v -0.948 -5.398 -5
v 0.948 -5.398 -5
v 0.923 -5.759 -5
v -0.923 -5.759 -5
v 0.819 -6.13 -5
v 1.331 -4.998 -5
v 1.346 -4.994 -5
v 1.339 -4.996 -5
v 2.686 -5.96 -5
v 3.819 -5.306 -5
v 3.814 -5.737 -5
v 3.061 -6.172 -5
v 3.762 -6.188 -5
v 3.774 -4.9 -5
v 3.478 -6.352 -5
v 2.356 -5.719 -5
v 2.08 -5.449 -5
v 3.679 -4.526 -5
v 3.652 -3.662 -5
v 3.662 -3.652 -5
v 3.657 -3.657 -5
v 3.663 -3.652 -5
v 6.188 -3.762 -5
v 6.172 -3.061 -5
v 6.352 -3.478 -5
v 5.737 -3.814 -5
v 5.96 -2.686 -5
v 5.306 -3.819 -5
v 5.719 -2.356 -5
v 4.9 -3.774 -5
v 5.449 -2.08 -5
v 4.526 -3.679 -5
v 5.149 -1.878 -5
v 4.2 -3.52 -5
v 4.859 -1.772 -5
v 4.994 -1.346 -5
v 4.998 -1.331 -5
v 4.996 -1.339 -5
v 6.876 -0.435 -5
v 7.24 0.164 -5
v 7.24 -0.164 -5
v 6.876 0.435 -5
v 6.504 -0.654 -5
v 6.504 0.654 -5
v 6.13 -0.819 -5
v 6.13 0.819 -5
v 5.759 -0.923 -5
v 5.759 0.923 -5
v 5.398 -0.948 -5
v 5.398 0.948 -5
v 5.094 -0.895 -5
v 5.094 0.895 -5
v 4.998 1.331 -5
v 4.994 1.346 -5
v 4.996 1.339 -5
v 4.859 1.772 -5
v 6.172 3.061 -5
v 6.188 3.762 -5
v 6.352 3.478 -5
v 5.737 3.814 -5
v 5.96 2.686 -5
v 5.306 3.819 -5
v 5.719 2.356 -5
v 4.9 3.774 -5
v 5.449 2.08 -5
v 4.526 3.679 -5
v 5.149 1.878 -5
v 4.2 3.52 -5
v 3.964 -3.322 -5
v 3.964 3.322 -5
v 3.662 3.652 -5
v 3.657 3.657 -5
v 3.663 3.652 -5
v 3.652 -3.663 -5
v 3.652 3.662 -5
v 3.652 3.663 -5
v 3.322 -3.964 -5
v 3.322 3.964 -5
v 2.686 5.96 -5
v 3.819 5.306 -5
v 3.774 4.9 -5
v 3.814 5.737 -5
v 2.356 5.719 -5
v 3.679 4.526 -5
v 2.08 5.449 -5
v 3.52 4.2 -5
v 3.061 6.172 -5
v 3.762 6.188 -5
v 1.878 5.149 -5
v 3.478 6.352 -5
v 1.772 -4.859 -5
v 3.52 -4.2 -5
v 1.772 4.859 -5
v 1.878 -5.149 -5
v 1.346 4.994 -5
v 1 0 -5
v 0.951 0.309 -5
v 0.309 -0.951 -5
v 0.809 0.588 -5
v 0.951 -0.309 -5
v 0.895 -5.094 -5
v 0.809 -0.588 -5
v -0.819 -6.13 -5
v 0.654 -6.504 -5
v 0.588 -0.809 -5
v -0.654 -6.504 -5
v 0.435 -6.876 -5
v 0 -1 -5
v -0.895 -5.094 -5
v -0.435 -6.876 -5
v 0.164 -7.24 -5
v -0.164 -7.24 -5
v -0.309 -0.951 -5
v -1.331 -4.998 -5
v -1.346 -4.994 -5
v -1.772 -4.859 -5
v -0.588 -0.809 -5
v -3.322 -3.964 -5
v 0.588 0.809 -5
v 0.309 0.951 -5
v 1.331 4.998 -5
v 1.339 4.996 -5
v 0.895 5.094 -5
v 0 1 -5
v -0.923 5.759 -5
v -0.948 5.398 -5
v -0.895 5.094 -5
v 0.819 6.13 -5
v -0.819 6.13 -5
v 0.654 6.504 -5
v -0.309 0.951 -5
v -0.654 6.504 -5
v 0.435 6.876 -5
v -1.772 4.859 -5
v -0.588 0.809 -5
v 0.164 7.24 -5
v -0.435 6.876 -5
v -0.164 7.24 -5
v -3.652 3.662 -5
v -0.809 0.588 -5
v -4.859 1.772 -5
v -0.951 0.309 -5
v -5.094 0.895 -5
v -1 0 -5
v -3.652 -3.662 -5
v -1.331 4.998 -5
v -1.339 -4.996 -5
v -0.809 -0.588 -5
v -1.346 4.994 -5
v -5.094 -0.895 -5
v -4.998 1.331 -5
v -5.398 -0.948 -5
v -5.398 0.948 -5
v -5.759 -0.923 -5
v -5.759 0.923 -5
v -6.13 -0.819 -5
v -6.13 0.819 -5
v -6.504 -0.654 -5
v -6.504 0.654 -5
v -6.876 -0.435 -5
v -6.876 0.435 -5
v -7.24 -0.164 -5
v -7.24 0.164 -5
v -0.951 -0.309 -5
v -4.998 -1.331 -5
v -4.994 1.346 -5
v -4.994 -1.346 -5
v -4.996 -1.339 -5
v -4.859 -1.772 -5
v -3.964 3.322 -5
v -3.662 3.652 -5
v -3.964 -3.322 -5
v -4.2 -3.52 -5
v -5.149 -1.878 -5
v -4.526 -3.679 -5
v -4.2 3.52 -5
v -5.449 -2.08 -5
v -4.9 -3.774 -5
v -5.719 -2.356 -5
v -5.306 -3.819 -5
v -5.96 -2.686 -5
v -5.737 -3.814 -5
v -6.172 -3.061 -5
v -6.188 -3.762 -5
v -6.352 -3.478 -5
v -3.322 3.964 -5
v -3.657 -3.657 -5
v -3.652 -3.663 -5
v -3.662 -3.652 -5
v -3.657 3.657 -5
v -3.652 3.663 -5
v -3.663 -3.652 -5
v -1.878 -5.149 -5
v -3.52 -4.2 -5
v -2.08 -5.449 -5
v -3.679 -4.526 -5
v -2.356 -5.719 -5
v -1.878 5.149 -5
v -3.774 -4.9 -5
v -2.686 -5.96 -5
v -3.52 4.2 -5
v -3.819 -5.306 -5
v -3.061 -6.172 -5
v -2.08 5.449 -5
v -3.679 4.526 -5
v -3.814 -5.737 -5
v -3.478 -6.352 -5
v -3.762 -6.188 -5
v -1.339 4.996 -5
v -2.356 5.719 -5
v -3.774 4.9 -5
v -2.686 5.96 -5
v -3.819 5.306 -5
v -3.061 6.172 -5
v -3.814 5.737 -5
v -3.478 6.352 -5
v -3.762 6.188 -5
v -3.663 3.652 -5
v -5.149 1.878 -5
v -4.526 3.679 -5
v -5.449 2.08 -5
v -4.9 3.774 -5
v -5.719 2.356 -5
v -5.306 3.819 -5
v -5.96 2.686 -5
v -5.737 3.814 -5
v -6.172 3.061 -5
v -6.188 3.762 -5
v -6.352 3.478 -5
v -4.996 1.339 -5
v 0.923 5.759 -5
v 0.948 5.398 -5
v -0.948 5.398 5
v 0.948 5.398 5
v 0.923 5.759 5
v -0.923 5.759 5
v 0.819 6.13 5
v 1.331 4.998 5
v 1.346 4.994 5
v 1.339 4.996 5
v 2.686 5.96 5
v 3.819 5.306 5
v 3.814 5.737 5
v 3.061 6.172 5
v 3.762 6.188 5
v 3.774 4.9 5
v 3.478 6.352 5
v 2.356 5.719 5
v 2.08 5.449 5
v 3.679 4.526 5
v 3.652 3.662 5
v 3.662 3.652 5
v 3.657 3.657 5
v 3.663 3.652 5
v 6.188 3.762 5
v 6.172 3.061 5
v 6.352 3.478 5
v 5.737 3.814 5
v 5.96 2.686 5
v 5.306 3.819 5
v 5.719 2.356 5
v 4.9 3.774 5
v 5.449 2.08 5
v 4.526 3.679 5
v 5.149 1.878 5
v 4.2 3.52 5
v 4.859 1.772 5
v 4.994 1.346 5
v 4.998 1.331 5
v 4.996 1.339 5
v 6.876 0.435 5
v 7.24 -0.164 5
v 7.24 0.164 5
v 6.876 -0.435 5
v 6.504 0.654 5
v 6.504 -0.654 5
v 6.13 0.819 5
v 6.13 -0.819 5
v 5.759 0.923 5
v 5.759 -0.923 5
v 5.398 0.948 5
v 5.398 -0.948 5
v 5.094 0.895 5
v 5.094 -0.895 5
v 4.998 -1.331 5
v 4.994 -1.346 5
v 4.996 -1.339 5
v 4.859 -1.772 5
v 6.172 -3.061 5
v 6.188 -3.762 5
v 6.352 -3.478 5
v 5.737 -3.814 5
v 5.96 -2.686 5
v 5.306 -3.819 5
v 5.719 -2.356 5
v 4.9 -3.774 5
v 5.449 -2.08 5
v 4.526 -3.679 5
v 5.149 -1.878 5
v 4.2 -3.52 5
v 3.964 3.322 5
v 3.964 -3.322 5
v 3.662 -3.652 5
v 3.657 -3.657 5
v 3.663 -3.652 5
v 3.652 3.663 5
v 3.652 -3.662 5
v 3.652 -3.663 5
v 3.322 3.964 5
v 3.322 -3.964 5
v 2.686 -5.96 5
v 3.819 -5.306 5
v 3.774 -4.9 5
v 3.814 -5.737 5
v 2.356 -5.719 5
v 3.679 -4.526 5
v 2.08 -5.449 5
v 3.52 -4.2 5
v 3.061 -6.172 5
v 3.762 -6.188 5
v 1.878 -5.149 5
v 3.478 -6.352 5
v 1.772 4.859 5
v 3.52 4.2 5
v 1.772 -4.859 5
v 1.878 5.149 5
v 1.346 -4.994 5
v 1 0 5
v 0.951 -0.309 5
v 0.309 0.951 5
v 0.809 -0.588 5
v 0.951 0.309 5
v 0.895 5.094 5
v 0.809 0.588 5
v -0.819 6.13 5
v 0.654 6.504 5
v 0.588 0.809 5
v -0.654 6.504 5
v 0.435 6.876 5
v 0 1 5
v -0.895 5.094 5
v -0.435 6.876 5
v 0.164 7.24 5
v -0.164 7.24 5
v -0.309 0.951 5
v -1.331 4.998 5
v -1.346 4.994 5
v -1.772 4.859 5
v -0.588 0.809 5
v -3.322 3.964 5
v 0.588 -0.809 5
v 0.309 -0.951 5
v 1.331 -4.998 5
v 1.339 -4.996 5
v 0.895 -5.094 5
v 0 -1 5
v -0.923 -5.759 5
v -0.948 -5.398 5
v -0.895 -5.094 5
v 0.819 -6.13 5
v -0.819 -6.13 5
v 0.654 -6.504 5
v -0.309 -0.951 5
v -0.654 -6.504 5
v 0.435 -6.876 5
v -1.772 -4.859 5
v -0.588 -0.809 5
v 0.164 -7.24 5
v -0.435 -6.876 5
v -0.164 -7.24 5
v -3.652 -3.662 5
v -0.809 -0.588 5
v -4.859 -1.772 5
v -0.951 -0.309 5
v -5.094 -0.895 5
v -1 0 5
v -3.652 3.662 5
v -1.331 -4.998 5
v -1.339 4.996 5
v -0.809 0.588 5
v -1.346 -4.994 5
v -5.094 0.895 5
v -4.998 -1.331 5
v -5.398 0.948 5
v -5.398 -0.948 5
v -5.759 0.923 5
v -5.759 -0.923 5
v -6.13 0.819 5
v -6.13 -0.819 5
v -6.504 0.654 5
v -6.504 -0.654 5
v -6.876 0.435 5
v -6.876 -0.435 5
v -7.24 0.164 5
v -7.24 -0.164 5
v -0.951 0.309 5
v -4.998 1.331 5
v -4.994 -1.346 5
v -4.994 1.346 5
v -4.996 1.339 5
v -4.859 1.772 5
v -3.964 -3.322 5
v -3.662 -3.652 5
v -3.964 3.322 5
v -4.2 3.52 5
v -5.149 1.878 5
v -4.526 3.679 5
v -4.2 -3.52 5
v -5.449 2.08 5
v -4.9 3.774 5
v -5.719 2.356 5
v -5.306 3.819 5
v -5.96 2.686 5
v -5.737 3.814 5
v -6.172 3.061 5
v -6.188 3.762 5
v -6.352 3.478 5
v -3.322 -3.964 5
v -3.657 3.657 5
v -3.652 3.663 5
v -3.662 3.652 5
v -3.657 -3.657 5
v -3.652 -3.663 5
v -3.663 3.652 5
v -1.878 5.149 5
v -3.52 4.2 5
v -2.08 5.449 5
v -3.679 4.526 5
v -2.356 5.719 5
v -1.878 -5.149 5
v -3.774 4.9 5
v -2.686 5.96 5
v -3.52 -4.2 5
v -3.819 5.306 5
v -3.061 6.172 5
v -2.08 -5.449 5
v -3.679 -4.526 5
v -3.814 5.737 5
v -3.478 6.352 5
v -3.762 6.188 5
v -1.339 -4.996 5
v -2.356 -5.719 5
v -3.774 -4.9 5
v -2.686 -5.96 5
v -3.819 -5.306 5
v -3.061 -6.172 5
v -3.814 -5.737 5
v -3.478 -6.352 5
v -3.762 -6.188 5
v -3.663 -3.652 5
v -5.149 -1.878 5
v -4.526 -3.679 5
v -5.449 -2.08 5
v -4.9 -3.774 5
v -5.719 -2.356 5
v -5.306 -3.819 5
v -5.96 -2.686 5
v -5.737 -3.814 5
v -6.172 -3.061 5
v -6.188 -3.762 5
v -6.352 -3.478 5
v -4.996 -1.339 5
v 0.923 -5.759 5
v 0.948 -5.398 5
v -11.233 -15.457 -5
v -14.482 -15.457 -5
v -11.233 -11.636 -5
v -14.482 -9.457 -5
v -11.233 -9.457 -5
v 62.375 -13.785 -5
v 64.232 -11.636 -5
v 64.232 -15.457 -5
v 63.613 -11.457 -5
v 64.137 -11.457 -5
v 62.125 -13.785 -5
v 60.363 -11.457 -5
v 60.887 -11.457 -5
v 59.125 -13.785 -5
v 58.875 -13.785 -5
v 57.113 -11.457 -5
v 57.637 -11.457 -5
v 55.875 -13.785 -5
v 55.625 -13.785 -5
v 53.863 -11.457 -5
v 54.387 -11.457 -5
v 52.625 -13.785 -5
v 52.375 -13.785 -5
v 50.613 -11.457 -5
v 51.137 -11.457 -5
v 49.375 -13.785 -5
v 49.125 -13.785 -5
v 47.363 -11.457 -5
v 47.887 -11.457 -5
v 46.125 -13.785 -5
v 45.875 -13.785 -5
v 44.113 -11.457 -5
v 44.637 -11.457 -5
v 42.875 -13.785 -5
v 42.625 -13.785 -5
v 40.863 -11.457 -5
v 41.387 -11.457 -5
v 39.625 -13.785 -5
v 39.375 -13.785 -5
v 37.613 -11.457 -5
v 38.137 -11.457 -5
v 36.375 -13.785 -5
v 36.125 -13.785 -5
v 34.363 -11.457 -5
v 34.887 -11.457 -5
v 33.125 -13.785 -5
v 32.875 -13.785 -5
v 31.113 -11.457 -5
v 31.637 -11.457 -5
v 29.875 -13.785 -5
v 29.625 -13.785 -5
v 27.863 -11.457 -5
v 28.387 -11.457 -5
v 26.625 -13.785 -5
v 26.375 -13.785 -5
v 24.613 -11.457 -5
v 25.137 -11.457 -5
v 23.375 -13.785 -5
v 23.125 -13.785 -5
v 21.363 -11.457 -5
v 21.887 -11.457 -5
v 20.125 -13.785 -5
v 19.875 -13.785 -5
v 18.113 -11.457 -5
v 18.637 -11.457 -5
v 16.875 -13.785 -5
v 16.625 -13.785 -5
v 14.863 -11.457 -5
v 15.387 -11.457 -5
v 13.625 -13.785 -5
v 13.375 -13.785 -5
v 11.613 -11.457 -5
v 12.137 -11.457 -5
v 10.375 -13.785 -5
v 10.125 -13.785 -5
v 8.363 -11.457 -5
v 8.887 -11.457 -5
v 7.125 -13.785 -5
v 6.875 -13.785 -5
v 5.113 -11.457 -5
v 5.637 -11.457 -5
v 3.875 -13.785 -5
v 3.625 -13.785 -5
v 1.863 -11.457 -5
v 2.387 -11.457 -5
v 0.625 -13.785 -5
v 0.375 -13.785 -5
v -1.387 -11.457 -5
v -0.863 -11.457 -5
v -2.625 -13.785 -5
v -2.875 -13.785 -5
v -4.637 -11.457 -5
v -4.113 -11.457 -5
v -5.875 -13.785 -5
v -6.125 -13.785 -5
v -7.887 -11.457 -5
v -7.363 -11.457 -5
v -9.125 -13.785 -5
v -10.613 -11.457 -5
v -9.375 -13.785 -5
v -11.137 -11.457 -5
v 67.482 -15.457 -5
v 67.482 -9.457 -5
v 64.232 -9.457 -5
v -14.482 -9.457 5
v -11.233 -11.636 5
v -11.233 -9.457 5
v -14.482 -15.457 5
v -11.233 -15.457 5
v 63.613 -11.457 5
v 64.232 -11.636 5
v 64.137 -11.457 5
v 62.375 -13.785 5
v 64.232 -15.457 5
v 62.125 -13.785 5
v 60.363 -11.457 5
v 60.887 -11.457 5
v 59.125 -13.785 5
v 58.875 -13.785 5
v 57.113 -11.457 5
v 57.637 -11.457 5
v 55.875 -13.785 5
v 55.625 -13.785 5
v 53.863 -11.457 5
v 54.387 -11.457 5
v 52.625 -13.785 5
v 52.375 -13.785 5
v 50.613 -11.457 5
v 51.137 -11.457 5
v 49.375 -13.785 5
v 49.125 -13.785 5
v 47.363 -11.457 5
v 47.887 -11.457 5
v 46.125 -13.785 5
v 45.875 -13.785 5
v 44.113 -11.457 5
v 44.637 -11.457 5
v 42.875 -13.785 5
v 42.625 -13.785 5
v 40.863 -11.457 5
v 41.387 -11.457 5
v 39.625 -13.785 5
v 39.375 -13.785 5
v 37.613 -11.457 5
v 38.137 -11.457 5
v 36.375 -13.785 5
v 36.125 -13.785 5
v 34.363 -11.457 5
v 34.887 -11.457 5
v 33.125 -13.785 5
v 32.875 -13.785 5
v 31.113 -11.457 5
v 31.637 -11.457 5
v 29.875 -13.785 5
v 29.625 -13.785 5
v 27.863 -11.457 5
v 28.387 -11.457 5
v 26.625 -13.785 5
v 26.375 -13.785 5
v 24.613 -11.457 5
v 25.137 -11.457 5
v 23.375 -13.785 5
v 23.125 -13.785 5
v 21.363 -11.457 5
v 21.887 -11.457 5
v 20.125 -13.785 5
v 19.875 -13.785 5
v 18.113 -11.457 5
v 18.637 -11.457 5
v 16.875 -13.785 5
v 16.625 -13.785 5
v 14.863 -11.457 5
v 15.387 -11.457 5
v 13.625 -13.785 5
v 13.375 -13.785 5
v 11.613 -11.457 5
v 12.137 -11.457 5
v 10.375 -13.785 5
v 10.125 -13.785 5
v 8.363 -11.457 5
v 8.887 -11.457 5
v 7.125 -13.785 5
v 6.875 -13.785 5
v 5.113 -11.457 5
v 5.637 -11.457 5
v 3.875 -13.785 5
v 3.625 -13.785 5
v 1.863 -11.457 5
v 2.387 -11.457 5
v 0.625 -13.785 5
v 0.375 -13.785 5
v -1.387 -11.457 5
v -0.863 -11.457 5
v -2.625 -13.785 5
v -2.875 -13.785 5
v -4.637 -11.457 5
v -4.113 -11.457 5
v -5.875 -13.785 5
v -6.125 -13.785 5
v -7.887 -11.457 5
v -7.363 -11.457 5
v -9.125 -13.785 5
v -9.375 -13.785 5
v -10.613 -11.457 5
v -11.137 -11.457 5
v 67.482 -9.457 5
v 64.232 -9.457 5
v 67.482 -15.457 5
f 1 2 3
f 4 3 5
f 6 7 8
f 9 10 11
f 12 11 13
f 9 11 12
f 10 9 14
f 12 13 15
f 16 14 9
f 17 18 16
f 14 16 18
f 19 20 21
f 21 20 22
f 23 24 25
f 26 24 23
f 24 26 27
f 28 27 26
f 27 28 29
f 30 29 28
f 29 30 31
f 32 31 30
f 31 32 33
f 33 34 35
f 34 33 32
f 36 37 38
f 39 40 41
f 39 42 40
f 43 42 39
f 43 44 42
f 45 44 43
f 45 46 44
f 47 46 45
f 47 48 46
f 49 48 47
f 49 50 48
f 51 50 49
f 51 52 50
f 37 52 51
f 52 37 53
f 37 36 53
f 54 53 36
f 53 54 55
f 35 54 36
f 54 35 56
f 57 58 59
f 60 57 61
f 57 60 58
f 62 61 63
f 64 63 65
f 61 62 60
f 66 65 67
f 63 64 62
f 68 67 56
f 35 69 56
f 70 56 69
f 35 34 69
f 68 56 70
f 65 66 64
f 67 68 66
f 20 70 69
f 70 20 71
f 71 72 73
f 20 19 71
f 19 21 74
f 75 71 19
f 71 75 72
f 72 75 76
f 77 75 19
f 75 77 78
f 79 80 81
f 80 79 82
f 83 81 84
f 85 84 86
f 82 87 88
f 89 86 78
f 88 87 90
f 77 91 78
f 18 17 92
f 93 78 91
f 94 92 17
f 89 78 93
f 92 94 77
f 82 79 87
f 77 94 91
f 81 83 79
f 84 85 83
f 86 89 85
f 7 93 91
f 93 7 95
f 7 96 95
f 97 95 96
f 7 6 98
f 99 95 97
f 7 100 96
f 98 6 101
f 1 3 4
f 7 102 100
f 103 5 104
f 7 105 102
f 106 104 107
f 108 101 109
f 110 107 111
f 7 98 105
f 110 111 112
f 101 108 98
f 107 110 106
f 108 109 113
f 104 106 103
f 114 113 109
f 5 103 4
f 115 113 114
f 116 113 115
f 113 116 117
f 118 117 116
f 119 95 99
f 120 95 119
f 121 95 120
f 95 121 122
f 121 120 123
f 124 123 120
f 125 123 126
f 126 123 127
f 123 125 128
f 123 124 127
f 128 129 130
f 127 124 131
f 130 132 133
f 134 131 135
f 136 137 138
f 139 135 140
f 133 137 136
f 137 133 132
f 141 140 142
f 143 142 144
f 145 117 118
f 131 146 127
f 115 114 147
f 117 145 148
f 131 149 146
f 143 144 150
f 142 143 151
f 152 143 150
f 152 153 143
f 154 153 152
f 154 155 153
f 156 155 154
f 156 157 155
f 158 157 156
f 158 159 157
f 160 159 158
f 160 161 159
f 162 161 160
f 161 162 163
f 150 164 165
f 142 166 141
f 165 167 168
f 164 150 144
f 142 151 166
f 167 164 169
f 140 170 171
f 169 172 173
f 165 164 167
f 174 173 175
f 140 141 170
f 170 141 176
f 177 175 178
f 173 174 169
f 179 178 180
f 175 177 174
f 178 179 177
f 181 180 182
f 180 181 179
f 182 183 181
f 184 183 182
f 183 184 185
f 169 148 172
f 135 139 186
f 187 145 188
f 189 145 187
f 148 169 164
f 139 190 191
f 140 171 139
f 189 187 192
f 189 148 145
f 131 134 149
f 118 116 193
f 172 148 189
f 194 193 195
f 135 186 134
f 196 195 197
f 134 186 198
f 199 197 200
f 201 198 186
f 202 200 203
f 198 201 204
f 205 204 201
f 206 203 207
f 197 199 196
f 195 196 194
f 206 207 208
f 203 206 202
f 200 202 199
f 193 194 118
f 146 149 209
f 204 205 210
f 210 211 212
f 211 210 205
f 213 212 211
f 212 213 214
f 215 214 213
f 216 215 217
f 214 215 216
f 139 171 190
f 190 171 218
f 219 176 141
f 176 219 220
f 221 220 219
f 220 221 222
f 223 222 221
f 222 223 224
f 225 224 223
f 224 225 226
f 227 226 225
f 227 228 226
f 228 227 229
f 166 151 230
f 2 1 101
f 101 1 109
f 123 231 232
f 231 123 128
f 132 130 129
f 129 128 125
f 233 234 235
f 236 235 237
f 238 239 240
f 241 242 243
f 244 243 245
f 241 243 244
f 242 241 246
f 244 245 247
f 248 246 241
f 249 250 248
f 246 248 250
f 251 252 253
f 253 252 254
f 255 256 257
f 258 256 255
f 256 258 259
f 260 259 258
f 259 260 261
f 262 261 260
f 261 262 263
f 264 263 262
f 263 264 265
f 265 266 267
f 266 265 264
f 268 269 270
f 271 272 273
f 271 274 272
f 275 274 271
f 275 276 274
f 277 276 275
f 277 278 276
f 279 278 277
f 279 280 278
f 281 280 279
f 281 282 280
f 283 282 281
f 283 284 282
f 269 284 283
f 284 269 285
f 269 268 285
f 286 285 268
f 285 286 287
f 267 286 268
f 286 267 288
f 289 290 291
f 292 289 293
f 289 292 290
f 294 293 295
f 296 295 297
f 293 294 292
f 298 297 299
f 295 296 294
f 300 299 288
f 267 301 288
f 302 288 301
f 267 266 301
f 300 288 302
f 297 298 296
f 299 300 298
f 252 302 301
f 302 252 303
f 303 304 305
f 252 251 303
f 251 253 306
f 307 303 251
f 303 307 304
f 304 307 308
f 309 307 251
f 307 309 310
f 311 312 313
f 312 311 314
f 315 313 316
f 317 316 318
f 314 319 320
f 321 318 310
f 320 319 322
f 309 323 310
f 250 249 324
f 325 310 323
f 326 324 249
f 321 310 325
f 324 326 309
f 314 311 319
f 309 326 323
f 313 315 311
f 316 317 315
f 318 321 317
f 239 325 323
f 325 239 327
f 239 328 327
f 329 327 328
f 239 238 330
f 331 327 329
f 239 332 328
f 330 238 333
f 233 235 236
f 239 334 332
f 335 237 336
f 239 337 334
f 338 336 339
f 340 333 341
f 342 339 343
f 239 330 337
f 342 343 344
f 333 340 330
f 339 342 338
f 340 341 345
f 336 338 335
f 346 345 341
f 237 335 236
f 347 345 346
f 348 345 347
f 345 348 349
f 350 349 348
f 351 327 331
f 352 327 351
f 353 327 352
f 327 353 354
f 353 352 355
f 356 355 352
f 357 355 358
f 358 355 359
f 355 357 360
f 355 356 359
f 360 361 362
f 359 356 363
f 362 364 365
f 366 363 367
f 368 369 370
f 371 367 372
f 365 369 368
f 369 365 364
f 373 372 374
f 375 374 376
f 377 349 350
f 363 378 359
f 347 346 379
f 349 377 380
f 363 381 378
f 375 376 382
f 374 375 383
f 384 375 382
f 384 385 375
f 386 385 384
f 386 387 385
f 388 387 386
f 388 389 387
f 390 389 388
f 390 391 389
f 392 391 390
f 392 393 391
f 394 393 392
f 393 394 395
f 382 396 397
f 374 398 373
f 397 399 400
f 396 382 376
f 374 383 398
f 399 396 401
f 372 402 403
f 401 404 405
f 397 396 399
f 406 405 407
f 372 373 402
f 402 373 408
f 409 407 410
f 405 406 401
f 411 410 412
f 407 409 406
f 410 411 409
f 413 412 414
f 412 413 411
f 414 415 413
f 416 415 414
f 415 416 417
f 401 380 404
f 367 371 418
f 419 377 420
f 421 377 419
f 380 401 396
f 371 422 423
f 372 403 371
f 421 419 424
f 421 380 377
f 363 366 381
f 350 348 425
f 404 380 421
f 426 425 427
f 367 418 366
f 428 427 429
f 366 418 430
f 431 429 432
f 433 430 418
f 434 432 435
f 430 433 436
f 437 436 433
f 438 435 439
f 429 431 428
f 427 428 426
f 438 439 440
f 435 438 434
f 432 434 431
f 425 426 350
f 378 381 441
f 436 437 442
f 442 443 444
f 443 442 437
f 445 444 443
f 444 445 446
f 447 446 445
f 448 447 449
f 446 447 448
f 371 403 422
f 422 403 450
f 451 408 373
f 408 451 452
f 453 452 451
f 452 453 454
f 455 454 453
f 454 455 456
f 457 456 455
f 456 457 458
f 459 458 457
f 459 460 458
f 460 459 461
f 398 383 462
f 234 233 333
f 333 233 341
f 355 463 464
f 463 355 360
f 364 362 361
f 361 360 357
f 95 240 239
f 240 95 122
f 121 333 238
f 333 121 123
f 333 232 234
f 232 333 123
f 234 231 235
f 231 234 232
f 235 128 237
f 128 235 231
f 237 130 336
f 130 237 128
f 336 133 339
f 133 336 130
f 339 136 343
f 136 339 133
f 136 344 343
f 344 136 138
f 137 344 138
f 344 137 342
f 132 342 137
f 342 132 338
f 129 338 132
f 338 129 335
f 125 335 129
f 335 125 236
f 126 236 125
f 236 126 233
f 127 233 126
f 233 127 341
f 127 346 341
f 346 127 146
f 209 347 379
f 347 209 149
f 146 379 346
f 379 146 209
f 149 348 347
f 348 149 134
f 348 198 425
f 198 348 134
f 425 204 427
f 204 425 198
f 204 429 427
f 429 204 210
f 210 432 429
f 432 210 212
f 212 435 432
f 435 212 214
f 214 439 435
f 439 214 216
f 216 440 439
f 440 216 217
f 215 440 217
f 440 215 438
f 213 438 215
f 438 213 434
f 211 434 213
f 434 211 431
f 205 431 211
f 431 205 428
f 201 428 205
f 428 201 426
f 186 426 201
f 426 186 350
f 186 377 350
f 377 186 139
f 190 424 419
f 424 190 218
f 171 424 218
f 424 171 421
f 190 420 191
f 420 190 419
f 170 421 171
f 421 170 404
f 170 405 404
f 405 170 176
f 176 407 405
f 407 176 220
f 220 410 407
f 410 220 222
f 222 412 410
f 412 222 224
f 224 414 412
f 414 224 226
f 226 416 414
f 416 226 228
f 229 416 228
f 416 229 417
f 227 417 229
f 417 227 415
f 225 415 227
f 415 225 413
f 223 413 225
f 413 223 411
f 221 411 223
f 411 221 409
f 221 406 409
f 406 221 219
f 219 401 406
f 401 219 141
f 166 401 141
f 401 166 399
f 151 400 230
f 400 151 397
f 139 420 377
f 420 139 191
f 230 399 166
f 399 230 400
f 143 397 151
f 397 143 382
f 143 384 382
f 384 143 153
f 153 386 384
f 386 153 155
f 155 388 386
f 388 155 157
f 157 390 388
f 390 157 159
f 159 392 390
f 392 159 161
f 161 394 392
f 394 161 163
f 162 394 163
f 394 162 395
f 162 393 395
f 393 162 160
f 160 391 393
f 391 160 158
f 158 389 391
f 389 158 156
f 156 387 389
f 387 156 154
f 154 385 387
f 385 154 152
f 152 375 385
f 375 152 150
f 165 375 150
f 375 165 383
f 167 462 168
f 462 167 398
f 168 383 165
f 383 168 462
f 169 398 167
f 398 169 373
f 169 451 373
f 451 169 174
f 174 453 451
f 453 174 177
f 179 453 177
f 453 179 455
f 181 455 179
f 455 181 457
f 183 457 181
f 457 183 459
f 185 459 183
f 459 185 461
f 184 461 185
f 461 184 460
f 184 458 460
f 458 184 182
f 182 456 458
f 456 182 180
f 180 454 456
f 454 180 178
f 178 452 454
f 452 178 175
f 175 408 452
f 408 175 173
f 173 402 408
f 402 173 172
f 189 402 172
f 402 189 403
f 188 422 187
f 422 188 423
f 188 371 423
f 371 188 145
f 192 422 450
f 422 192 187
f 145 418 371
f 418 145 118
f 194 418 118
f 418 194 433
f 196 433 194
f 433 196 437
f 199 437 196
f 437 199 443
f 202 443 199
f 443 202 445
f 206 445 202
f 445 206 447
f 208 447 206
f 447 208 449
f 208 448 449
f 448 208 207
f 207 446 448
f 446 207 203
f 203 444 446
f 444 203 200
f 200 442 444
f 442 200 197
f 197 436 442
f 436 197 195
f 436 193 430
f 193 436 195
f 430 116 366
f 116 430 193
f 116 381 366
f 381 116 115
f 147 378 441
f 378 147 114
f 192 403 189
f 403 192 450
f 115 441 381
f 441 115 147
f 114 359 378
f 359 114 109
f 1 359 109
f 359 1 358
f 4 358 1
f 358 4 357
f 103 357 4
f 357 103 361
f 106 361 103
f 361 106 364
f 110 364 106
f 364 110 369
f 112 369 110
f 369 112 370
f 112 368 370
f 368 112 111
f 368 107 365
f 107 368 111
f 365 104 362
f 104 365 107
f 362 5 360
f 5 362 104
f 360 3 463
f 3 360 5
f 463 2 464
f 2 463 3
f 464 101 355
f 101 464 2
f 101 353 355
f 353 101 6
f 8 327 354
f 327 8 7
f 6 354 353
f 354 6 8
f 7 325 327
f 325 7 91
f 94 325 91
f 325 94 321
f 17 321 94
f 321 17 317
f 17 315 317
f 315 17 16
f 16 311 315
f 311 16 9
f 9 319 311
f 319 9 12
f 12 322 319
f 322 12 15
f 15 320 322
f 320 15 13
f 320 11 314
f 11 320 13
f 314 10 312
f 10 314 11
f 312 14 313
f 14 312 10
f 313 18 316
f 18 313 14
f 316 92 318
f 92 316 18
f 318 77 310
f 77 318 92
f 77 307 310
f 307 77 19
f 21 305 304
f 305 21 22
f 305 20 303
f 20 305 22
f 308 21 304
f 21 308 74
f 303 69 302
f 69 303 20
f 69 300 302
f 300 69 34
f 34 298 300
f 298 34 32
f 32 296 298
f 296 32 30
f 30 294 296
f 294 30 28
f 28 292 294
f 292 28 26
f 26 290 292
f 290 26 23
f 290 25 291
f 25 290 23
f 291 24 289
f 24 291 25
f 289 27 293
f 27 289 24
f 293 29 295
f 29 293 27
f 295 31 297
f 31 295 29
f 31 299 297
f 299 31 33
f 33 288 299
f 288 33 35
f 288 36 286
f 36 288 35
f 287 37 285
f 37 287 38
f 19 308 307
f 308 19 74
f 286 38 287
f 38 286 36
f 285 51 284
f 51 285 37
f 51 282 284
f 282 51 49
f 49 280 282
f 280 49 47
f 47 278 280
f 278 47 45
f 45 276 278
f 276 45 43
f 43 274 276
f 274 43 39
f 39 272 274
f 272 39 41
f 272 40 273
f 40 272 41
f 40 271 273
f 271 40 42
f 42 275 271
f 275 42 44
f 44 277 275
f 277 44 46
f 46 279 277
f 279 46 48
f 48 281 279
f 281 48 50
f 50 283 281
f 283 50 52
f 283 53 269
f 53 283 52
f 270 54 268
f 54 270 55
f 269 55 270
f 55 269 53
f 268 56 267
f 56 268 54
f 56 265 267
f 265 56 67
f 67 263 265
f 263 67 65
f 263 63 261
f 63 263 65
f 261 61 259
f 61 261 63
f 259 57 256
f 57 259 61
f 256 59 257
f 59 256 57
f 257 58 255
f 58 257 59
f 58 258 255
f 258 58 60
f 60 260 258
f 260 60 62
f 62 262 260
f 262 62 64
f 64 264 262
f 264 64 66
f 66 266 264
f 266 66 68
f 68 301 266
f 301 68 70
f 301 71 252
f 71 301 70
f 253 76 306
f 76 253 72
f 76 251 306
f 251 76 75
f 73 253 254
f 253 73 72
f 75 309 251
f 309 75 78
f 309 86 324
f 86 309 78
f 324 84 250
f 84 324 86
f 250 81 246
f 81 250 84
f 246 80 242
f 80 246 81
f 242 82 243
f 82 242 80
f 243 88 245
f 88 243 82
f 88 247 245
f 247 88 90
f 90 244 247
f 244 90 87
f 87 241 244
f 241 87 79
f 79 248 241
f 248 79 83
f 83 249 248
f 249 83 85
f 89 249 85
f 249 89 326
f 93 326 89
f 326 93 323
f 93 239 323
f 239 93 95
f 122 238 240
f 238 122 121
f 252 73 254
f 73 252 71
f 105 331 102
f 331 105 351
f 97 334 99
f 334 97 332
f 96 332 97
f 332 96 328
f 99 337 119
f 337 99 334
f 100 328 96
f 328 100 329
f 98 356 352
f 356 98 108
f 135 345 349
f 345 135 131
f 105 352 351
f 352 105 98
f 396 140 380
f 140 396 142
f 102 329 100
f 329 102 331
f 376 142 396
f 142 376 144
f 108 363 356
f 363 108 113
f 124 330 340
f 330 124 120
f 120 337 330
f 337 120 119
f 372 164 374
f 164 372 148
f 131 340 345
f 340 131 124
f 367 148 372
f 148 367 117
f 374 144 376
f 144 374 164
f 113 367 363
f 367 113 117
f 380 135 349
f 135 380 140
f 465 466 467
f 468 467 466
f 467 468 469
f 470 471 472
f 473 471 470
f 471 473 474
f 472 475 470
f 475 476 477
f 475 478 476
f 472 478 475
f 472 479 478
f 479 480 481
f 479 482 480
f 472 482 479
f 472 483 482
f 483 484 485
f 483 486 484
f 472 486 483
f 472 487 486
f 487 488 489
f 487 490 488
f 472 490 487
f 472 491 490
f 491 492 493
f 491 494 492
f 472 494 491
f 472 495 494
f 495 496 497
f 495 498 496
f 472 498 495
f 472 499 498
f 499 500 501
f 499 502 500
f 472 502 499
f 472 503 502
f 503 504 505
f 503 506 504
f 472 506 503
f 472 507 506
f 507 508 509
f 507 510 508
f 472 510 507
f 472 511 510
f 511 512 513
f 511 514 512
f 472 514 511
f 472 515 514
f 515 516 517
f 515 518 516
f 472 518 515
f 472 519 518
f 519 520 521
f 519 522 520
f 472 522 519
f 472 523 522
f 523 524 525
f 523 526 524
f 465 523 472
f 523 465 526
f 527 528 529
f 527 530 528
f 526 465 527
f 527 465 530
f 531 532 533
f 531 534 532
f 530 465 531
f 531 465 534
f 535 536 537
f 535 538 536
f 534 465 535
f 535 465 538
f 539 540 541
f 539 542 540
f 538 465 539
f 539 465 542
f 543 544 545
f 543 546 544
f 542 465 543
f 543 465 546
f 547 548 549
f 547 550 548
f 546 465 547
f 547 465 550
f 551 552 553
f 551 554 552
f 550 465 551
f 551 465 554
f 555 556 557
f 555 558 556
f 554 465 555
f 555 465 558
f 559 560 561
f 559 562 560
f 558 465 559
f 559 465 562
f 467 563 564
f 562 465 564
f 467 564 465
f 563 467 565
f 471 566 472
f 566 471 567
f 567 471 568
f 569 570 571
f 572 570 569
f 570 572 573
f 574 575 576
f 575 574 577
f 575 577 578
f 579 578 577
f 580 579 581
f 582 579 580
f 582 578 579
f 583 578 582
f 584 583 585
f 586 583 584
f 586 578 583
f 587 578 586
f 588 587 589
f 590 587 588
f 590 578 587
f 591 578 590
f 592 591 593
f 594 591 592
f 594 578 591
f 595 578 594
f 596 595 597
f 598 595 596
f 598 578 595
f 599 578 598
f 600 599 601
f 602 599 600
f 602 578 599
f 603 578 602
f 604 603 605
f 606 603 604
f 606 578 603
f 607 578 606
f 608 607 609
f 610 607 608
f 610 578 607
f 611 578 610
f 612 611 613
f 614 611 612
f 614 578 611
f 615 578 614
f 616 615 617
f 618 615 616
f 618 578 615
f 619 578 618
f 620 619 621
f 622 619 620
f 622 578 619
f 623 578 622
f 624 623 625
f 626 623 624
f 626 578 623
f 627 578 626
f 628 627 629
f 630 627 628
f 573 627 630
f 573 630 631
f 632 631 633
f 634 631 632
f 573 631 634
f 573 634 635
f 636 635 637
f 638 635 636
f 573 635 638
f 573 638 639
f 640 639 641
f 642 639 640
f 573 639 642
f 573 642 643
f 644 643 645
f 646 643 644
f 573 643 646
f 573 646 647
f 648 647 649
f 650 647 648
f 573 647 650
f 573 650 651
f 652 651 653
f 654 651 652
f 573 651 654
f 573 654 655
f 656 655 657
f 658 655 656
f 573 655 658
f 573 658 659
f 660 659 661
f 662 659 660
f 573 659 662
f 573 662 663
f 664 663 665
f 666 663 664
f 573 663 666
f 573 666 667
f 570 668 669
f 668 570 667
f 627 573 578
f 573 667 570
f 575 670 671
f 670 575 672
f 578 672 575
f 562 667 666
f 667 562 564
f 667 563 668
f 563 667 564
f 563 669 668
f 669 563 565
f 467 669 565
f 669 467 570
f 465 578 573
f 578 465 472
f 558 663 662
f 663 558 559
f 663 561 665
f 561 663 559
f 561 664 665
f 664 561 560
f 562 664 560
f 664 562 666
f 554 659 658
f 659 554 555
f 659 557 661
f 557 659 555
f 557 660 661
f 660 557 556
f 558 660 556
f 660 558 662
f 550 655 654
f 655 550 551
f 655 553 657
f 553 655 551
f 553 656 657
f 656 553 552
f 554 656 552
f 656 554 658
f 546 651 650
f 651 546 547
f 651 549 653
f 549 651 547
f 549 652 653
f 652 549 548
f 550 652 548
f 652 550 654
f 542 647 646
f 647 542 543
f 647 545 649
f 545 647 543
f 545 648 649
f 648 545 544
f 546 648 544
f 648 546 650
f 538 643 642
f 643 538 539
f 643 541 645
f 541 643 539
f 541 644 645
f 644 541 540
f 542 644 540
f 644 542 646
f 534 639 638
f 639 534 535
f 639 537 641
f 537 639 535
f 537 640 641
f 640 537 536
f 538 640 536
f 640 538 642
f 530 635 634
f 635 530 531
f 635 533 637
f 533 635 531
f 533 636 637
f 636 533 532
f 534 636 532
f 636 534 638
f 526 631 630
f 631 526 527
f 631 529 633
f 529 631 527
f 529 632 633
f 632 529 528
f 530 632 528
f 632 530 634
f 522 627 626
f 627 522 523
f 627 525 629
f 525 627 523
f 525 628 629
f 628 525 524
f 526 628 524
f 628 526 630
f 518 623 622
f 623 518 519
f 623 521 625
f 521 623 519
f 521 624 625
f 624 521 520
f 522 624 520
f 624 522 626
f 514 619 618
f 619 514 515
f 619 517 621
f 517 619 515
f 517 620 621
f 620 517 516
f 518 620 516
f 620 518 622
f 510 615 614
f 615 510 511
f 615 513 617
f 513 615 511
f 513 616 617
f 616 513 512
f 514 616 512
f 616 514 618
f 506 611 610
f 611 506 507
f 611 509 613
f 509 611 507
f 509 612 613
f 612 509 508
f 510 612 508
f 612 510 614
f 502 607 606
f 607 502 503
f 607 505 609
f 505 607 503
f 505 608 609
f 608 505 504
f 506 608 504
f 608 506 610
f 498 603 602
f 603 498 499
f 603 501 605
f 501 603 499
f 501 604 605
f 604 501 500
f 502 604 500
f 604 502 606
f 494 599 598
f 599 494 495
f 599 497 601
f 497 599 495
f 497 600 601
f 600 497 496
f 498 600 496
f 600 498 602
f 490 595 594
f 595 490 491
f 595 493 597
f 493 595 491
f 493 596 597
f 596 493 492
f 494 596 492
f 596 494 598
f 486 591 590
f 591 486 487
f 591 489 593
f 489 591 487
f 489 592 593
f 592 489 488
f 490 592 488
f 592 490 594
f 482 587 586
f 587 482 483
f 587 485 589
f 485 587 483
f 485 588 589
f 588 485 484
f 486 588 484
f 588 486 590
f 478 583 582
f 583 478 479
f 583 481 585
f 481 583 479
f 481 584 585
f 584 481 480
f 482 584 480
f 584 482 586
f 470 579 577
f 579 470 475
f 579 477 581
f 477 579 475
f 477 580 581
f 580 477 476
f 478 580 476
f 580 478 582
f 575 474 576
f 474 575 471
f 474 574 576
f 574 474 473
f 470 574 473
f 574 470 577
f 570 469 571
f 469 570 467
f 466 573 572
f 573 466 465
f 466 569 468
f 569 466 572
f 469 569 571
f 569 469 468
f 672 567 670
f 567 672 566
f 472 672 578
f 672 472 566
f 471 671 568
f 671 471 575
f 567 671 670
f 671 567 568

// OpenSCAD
//This is a modification of " Public Domain Parametric Involute Spur Gear (and involute helical gear and involute rack)
// by Leemon Baird, 2011, Leemon@Leemon.com
//http://www.thingiverse.com/thing:5505  "

//Modifications by racatack June 2016:
// v1.0, 6/24/16:
//  -Incorporated 'module InvoluteGear_rack()' from the 11/11/15 comment by quisam2342 in thing:5505 to fix noted problems in rack generation at various tooth sizes
//  -Added a section for an optional 'backboard' that can be used to stiffen an otherwise skinny rack
//  -Added sections for optional Stop Blocks at either or both ends of a rack
//  -Removed extra gears from the example since I only need one pinion. See thing:5505 example section to gain more insight into gear generation.
//v1.1, 6/28/16:
//  -Added sections to optionally create mounting flanges on the bottom/backside of the rack. Flanges can be at either or both ends, or longitudinal.

//TO GENERATE A CUSTOM RACK AND PINION ENTER INPUTS AT LINES 345-377


//////////////////////////////////////////////////////////////////////////////////////////////
// Public Domain Parametric Involute Spur Gear (and involute helical gear and involute rack)
// version 1.1
// by Leemon Baird, 2011, Leemon@Leemon.com
//http://www.thingiverse.com/thing:5505
//
// This file is public domain.  Use it for any purpose, including commercial
// applications.  Attribution would be nice, but is not required.  There is
// no warranty of any kind, including its correctness, usefulness, or safety.
// 
// This is parameterized involute spur (or helical) gear.  It is much simpler and less powerful than
// others on Thingiverse.  But it is public domain.  I implemented it from scratch from the 
// descriptions and equations on Wikipedia and the web, using Mathematica for calculations and testing,
// and I now release it into the public domain.
//
//		http://en.wikipedia.org/wiki/Involute_gear
//		http://en.wikipedia.org/wiki/Gear
//		http://en.wikipedia.org/wiki/List_of_gear_nomenclature
//		http://gtrebaol.free.fr/doc/catia/spur_gear.html
//		http://www.cs.cmu.edu/~rapidproto/mechanisms/chpt7.html
//
// The module gear() gives an involute spur gear, with reasonable defaults for all the parameters.
// Normally, you should just choose the first 4 parameters, and let the rest be default values.
// The module gear() gives a gear in the XY plane, centered on the origin, with one tooth centered on
// the positive Y axis.  The various functions below it take the same parameters, and return various
// measurements for the gear.  The most important is pitch_radius, which tells how far apart to space
// gears that are meshing, and adendum_radius, which gives the size of the region filled by the gear.
// A gear has a "pitch circle", which is an invisible circle that cuts through the middle of each
// tooth (though not the exact center). In order for two gears to mesh, their pitch circles should 
// just touch.  So the distance between their centers should be pitch_radius() for one, plus pitch_radius() 
// for the other, which gives the radii of their pitch circles.
//
// In order for two gears to mesh, they must have the same mm_per_tooth and pressure_angle parameters.  
// mm_per_tooth gives the number of millimeters of arc around the pitch circle covered by one tooth and one
// space between teeth.  The pitch angle controls how flat or bulged the sides of the teeth are.  Common
// values include 14.5 degrees and 20 degrees, and occasionally 25.  Though I've seen 28 recommended for
// plastic gears. Larger numbers bulge out more, giving stronger teeth, so 28 degrees is the default here.
//
// The ratio of number_of_teeth for two meshing gears gives how many times one will make a full 
// revolution when the the other makes one full revolution.  If the two numbers are coprime (i.e. 
// are not both divisible by the same number greater than 1), then every tooth on one gear
// will meet every tooth on the other, for more even wear.  So coprime numbers of teeth are good.
//
// The module rack() gives a rack, which is a bar with teeth.  A rack can mesh with any
// gear that has the same mm_per_tooth and pressure_angle.
//
// Some terminology: 
// The outline of a gear is a smooth circle (the "pitch circle") which has mountains and valleys
// added so it is toothed.  So there is an inner circle (the "root circle") that touches the 
// base of all the teeth, an outer circle that touches the tips of all the teeth,
// and the invisible pitch circle in between them.  There is also a "base circle", which can be smaller than
// all three of the others, which controls the shape of the teeth.  The side of each tooth lies on the path 
// that the end of a string would follow if it were wrapped tightly around the base circle, then slowly unwound.  
// That shape is an "involute", which gives this type of gear its name.
//
//////////////////////////////////////////////////////////////////////////////////////////////

//An involute spur gear, with reasonable defaults for all the parameters.
//Normally, you should just choose the first 4 parameters, and let the rest be default values.
//Meshing gears must match in mm_per_tooth, pressure_angle, and twist,
//and be separated by the sum of their pitch radii, which can be found with pitch_radius().
module gear (
	mm_per_tooth    = 3,    //this is the "circular pitch", the circumference of the pitch circle divided by the number of teeth
	number_of_teeth = 11,   //total number of teeth around the entire perimeter
	thickness       = 6,    //thickness of gear in mm
	hole_diameter   = 3,    //diameter of the hole in the center, in mm
	twist           = 0,    //teeth rotate this many degrees from bottom of gear to top.  360 makes the gear a screw with each thread going around once
	teeth_to_hide   = 0,    //number of teeth to delete to make this only a fraction of a circle
	pressure_angle  = 28,   //Controls how straight or bulged the tooth sides are. In degrees.
	clearance       = 0.0,  //gap between top of a tooth on one gear and bottom of valley on a meshing gear (in millimeters)
	backlash        = 0.0   //gap between two meshing teeth, in the direction along the circumference of the pitch circle
) {
	assign(pi = 3.1415926)
	assign(p  = mm_per_tooth * number_of_teeth / pi / 2)  //radius of pitch circle
	assign(c  = p + mm_per_tooth / pi - clearance)        //radius of outer circle
	assign(b  = p*cos(pressure_angle))                    //radius of base circle
	assign(r  = p-(c-p)-clearance)                        //radius of root circle
	assign(t  = mm_per_tooth/2-backlash/2)                //tooth thickness at pitch circle
	assign(k  = -iang(b, p) - t/2/p/pi*180) {             //angle to where involute meets base circle on each side of tooth
		difference() {
			for (i = [0:number_of_teeth-teeth_to_hide-1] )
				rotate([0,0,i*360/number_of_teeth])
					linear_extrude(height = thickness, center = true, convexity = 10, twist = twist)
						polygon(
							points=[
								[0, -hole_diameter/10],
								polar(r, -181/number_of_teeth),
								polar(r, r<b ? k : -180/number_of_teeth),
								q7(0/5,r,b,c,k, 1),q7(1/5,r,b,c,k, 1),q7(2/5,r,b,c,k, 1),q7(3/5,r,b,c,k, 1),q7(4/5,r,b,c,k, 1),q7(5/5,r,b,c,k, 1),
								q7(5/5,r,b,c,k,-1),q7(4/5,r,b,c,k,-1),q7(3/5,r,b,c,k,-1),q7(2/5,r,b,c,k,-1),q7(1/5,r,b,c,k,-1),q7(0/5,r,b,c,k,-1),
								polar(r, r<b ? -k : 180/number_of_teeth),
								polar(r, 181/number_of_teeth)
							],
 							paths=[[0,1,2,3,4,5,6,7,8,9,10,11,12,13,14,15,16]]
						);
			cylinder(h=2*thickness+1, r=hole_diameter/2, center=true, $fn=20);
		}
	}
};	
//these 4 functions are used by gear
function polar(r,theta)   = r*[sin(theta), cos(theta)];                            //convert polar to cartesian coordinates
function iang(r1,r2)      = sqrt((r2/r1)*(r2/r1) - 1)/3.1415926*180 - acos(r1/r2); //unwind a string this many degrees to go from radius r1 to radius r2
function q7(f,r,b,r2,t,s) = q6(b,s,t,(1-f)*max(b,r)+f*r2);                         //radius a fraction f up the curved side of the tooth 
function q6(b,s,t,d)      = polar(d,s*(iang(b,d)+t));                              //point at radius d on the involute curve

//a rack, which is a straight line with teeth (the same as a segment from a giant gear with a huge number of teeth).
//The "pitch circle" is a line along the X axis.
//module rack (
//	mm_per_tooth    = 3,    //this is the "circular pitch", the circumference of the pitch circle divided by the number //of teeth
//	number_of_teeth = 11,   //total number of teeth along the rack
//	thickness       = 6,    //thickness of rack in mm (affects each tooth)
//	height          = 120,   //height of rack in mm, from tooth top to far side of rack.
//	pressure_angle  = 28,   //Controls how straight or bulged the tooth sides are. In degrees.
//	backlash        = 0.0   //gap between two meshing teeth, in the direction along the circumference of the pitch circle
//) {
//	assign(pi = 3.1415926)
//	assign(a = mm_per_tooth / pi) //addendum
//	assign(t = a*cos(pressure_angle)-1)         //tooth side is tilted so top/bottom corners move this amount
//		for (i = [0:number_of_teeth-1] )
//			translate([i*mm_per_tooth,0,0])
//				linear_extrude(height = thickness, center = true, convexity = 10)
//					polygon(
//						points=[
//							[-mm_per_tooth * 3/4,                 a-height],
//							[-mm_per_tooth * 3/4 - backlash,     -a],
//							[-mm_per_tooth * 1/4 + backlash - t, -a],
//							[-mm_per_tooth * 1/4 + backlash + t,  a],
//							[ mm_per_tooth * 1/4 - backlash - t,  a],
//							[ mm_per_tooth * 1/4 - backlash + t, -a],
//							[ mm_per_tooth * 3/4 + backlash,     -a],
//							[ mm_per_tooth * 3/4,                 a-height],
//						],
//						paths=[[0,1,2,3,4,5,6,7]]
//					);
//};	


  //rac note - This section generates the rack body and teeth. It is from the 11/11/15 comment by quisam2342 in thing:5505 to fix noted problems with rack generation, and replaces the original 'module rack()'
////////////////////////////////////////////////////////////////////////////////////////////////
// The module InvoluteGear_rack() gives a involute gear rack, which is a bar with teeth.
// A rack can mesh with any gear that has the same mm_per_tooth and pressure_angle.
// The "pitch circle" is a line along the X axis.
//
// mm_per_tooth     this is the "circular pitch", the circumference of the pitch circle
//                  divided by the number of teeth
//
// number_of_teeth  total number of teeth along the rack
//
// thickness        thickness of rack in mm
//
// height           height of rack in mm, from tooth top to far side of rack
//
// pressure_angle   controls how straight or bulged the tooth sides are, in degrees
//
// clearance        gap between top of a tooth on one gear and bottom of valley
//                  on a meshing gear, in millimeters
//
// backlash         gap between two meshing teeth, in the direction along the circumference
//                  of the pitch circle
////////////////////////////////////////////////////////////////////////////////////////////////



module InvoluteGear_rack (

   //Default numbers in this section get overridden by numbers in 'example rack and pinion' section, so set your values there.
   
    mm_per_tooth    = 3, //all meshing gears need the same mm_per_tooth 
    number_of_teeth = 11,
    thickness       = 6,
    height          = 4,
    
  //rac - Added variables for backboard, stop blocks and mounting flanges: 
 //set your values in the 'example rack and pinion' section, as defaults given here will be overridden by that section 
    backboard_thickness = 2.0,
    backboard_height = 1.0,
    side_flange_thickness = 0,
    side_flange_height = 0,
    flange_offset = 0, 
    stop_height = backboard_height,
    left_stop_enable = 1, 
    right_stop_enable = 1,
    flange_height = 0,
    left_flange_enable = 1, 
    right_flange_enable = 1,
    
//These defaults are not redefined in the example section:
    pressure_angle  = 28,  //all meshing gears need the same pressure_angle
    clearance       = 0.0,
    backlash        = 0.0

)

{
    // addendum - tooth height above pitch line
    assign(addendum =        module_value(mm_per_tooth) - clearance)

    // dedendum - tooth height below pitch line
    assign(dedendum = 1.25 * module_value(mm_per_tooth)            ) 


    for (i = [0:number_of_teeth-1] )
        translate([(i+0.5)*mm_per_tooth,height-addendum,0])
            linear_extrude(height = thickness, center = true, convexity = 10)  //'height' parameter here is not the same as 'height' parameter of module. Here it effectively is the width or thickness as the rack is extruded from one side-face to the other.
                polygon(
                    points=[
                        [-1/2 * mm_per_tooth,                                              addendum-height],
                        [-1/2 * mm_per_tooth,                                             -dedendum],
                        [-1/4 * mm_per_tooth + backlash - dedendum * tan(pressure_angle), -dedendum],
                        [-1/4 * mm_per_tooth + backlash + addendum * tan(pressure_angle),  addendum],
                        [ 1/4 * mm_per_tooth - backlash - addendum * tan(pressure_angle),  addendum],
                        [ 1/4 * mm_per_tooth - backlash + dedendum * tan(pressure_angle), -dedendum],
                        [ 1/2 * mm_per_tooth,                                             -dedendum],
                        [ 1/2 * mm_per_tooth,                                              addendum-height],
                    ],
                    paths=[[0,1,2,3,4,5,6,7]]
                );

   //rac -added - This section optionally creates a 'stop block' at the left end of the rack
            translate([(-0.11)*mm_per_tooth,0,0.5*(-thickness)])  
            linear_extrude(height = left_stop_enable*thickness, center = false, convexity = 10)
                polygon(
                    points=[
                        [-1/2 * mm_per_tooth,height+stop_height],   //stop_height extends stop block above teeth, change the number to change the extension amount
                        [-1/2 * mm_per_tooth,0],
                        [ 1/2 * mm_per_tooth,0],
                        [ 1/2 * mm_per_tooth,height+stop_height],   //stop_height extends stop block above teeth, change the number to change the extension amount
                    ],
                    paths=[[0,1,2,3]]
                );


    //rac -added - This section optionally creates a 'stop block' at the right end of the rack
            translate([(0.11+number_of_teeth)*mm_per_tooth,0,0.5*(-thickness)])  
            linear_extrude(height = right_stop_enable*thickness, center = false, convexity = 10)
                polygon(
                    points=[
                        [-1/2 * mm_per_tooth,height+stop_height],   //stop_height extends stop block above teeth
                        [-1/2 * mm_per_tooth,0],
                        [ 1/2 * mm_per_tooth,0],
                        [ 1/2 * mm_per_tooth,height+stop_height],   //stop_height extends stop block above teeth
                    ],
                    paths=[[0,1,2,3]]
                );


    //rac -added - This section optionally creates a flange at the left rear of the rack
            translate([(-0.11)*mm_per_tooth,0,0.5*(-thickness)])   
            linear_extrude(height = left_flange_enable*thickness, center = false, convexity = 10)
                polygon(
                    points=[
                        [-1/2 * mm_per_tooth,-flange_height],   //flange_height extends flange beyond rack bottom
                        [-1/2 * mm_per_tooth,0],
                        [ 1/2 * mm_per_tooth,0],
                        [ 1/2 * mm_per_tooth,-flange_height],   //flange_height extends flange beyond rack bottom
                    ],
                    paths=[[0,1,2,3]]
                );



    //rac -added - This section optionally creates a flange at the right rear of the rack
            translate([(0.11+number_of_teeth)*mm_per_tooth,0,0.5*(-thickness)])  
            linear_extrude(height = right_flange_enable*thickness, center = false, convexity = 10)
                polygon(
                    points=[
                        [-1/2 * mm_per_tooth,-flange_height],   //flange_height extends flange beyond rack bottom
                        [-1/2 * mm_per_tooth,0],
                        [ 1/2 * mm_per_tooth,0],
                        [ 1/2 * mm_per_tooth,-flange_height],   //flange_height extends flange beyond rack bottom
                    ],
                    paths=[[0,1,2,3]]
                );



    //rac -added - This section optionally creates a 'Backboard' on one side of the rack. Can be used to add stiffness for a 'thin' rack (i.e. a rack with low height and/or thickness numbers) or if a large negative height is used it can extend under the rack as a mounting flange.
    for (i = [0:number_of_teeth-1] )
        translate([(i+0.5)*mm_per_tooth,0,0.5*(-thickness+backboard_thickness)])    
        //0.5*(-thickness+backboard_thickness) starts the backboard at one side of the rack and extrudes it inward
            linear_extrude(height = backboard_thickness, center = true, convexity = 10)
                polygon(
                    points=[
                        [-1/2 * mm_per_tooth,height+backboard_height],   //backboard_height extends backboard above teeth
                        [-1/2 * mm_per_tooth,0],

                        [ 1/2 * mm_per_tooth,0],
                        [ 1/2 * mm_per_tooth,height+backboard_height],   //backboard_height extends backboard above teeth
                    ],
                    paths=[[0,1,2,3]]
                );


    //rac -added - This section optionally creates a Rear Side-Flange on along one side of the rack. Can be used to add stiffness for a 'thin' rack (i.e. a rack with low height and/or thickness numbers) or it can be used as a mounting flange.
    for (i = [0:number_of_teeth-1] )
        translate([(i+0.5)*mm_per_tooth,0,0.5*(-thickness+side_flange_thickness)+flange_offset])    
        //0.5*(-side_flange_thickness) starts the backboard at one side of the rack and extrudes it inward. flange_offset moves the flange toward the other side of the rack
            linear_extrude(height = side_flange_thickness, center = true, convexity = 10)
                polygon(
                    points=[
                        [-1/2 * mm_per_tooth,-side_flange_height],   //side_flange_height extends side_flange beyond rack bottom
                        [-1/2 * mm_per_tooth,0],

                        [ 1/2 * mm_per_tooth,0],
                        [ 1/2 * mm_per_tooth,-side_flange_height],   //side_flange_height extends backboard beyond rack bottom
                    ],
                    paths=[[0,1,2,3]]
                );

}


//These 5 functions let the user find the derived dimensions of the gear.
//A gear fits within a circle of radius outer_radius, and two gears should have
//their centers separated by the sum of their pictch_radius.
function circular_pitch  (mm_per_tooth=3) = mm_per_tooth;                     //tooth density expressed as "circular pitch" in millimeters
function diametral_pitch (mm_per_tooth=3) = 3.1415926 / mm_per_tooth;         //tooth density expressed as "diametral pitch" in teeth per millimeter
function module_value    (mm_per_tooth=3) = mm_per_tooth / 3.1415926;                //tooth density expressed as "module" or "modulus" in millimeters
function pitch_radius    (mm_per_tooth=3,number_of_teeth=11) = mm_per_tooth * number_of_teeth / 3.1415926 / 2;
function outer_radius    (mm_per_tooth=3,number_of_teeth=11,clearance=0.1)    //The gear fits entirely within a cylinder of this radius.
	= mm_per_tooth*(1+number_of_teeth/2)/3.1415926  - clearance;              





//////////////////////////////////////////////////////////////////////////////////////////////

//GENERATE A RACK AND PINION 
//ENTER YOUR VALUES HERE: (not in defaults of InvoluteGear_rack() or gear() modules)

//The variable names can be confusing - experiment! Change something then click the dotted cube with Fast-Forward arrows.

//example rack and pinion:
//all distances in mm
n1 = 12; //red gear number of teeth. Set to zero if you don't want to print a pinion.
n5 = 24;  //gray rack number of teeth.  Set to 1 if you don't want to print a rack- that's as small as it gets (you'll get 2 teeth if you set it to zero... I haven't tried to determine why that happens)
mm_per_tooth = 3.25;
thickness    = 10;  // depth of the rack from side-to-side, including backboard if any. The pinion will be this depth minus the backboard_thickness
hole         = 2;   //hole diameter in pinion gear
height       = 4;  // distance from bottom of the rack to the tips of the teeth

//rac-Added - Set your values here for  a Backboard along one side of the teeth.
backboard_thickness = 0; //set to zero for no backboard
    backboard_height = 2;   //set to zero for top of backboard to be even with tips of teeth, a positive number will extend above the teeth by the chosen amount. Negative number will place the top of the backboard lower than the teeth.

//rac-Added - Set your values here for a rear Side-Flange along one side of the teeth extending to the rear of the rack (opposite the direction of a backboard).
side_flange_thickness = 0; //set to zero for no rear Side-Flange
    side_flange_height = 10; // A positive number extends the side-flange beyond the bottom of the rack the by specified amount.
    flange_offset = 0; //Set to zero for a flange running coplanar with one side of the teeth. A positive number moves the flange toward other side of the teeth

//rac-Added - Set your values here for Stop Blocks at one or both ends.
stop_height = 2; //Stop Blocks will extend this much above the teeth. A positive number will extend above the teeth by the chosen amount. Negative number will place the top of the block lower than the teeth. 
    left_stop_enable = 1;  //set to 1 to generate Left Stop Block, set to 0 to disable
    right_stop_enable = 1;  //set to 1 to generate Right Stop Block, set to 0 to disable

//rac-Added - Set your values here for rear End-Flanges at one or both ends.    
flange_height = 2.25; //Flanges will extend this much from the bottom of the rack. ****Combine with 0 height Stop Blocks to effectively start flanges at top of tooth instead of backside.****
    left_flange_enable = 0;  //set to 1 to generate Left Rear Flange, set to 0 to disable. 
    right_flange_enable = 0;  //set to 1 to generate Right Rear Flange, set to 0 to disable.
//end of inputs -------------------------------------------------------

d1 =pitch_radius(mm_per_tooth,n1);

//Generation of pinion gear:
translate([ 0,    0, -.5*backboard_thickness]) rotate([0,0, $t*360/n1])                 color([1.00,0.75,0.75]) gear(mm_per_tooth,n1,(thickness-backboard_thickness),hole); //rac -RE above: 'thickness-backboard_thickness' is used here to reduce gear thickness for backboard on rack, The '-.5*backboard_thickness' in translate puts gear bottom even with rack bottom

//Generation of rack, and Relative positioning of gear and rack:
translate([(-floor(n5/2)-floor(n1/2)+$t+n1/2-1/2), -height-backboard_height-d1-mm_per_tooth, 0]) rotate([0,0,0]) color([0.75,0.75,0.75]) InvoluteGear_rack(mm_per_tooth,n5,thickness,height,backboard_thickness,backboard_height,side_flange_thickness,side_flange_height,flange_offset,stop_height,left_stop_enable,right_stop_enable,flange_height,left_flange_enable,right_flange_enable);   //rac - In the above 'translate' instruction, the middle parameter sets spacing between the rack and the pinion. I've set it to '-height-backboard_height-d1-mm_per_tooth' to give a proportionate offset that allows for ease of printing for most sets of gear & rack parameters. If you use a large NEGATIVE backboard height THE GEAR AND RACK MAY OVERLAP. That can be fixed by substituting some other number/formula for '-height-backboard_height-d1-mm_per_tooth'. Try for example -3*d1, or just subtract an additional fixed offset from what's in there now (e.g. (-height-backboard_height-d1-mm_per_tooth)-14.)

//end of example rack and pinion 
//////////////////////////////////////////////////////////////////////////////////////////////////
